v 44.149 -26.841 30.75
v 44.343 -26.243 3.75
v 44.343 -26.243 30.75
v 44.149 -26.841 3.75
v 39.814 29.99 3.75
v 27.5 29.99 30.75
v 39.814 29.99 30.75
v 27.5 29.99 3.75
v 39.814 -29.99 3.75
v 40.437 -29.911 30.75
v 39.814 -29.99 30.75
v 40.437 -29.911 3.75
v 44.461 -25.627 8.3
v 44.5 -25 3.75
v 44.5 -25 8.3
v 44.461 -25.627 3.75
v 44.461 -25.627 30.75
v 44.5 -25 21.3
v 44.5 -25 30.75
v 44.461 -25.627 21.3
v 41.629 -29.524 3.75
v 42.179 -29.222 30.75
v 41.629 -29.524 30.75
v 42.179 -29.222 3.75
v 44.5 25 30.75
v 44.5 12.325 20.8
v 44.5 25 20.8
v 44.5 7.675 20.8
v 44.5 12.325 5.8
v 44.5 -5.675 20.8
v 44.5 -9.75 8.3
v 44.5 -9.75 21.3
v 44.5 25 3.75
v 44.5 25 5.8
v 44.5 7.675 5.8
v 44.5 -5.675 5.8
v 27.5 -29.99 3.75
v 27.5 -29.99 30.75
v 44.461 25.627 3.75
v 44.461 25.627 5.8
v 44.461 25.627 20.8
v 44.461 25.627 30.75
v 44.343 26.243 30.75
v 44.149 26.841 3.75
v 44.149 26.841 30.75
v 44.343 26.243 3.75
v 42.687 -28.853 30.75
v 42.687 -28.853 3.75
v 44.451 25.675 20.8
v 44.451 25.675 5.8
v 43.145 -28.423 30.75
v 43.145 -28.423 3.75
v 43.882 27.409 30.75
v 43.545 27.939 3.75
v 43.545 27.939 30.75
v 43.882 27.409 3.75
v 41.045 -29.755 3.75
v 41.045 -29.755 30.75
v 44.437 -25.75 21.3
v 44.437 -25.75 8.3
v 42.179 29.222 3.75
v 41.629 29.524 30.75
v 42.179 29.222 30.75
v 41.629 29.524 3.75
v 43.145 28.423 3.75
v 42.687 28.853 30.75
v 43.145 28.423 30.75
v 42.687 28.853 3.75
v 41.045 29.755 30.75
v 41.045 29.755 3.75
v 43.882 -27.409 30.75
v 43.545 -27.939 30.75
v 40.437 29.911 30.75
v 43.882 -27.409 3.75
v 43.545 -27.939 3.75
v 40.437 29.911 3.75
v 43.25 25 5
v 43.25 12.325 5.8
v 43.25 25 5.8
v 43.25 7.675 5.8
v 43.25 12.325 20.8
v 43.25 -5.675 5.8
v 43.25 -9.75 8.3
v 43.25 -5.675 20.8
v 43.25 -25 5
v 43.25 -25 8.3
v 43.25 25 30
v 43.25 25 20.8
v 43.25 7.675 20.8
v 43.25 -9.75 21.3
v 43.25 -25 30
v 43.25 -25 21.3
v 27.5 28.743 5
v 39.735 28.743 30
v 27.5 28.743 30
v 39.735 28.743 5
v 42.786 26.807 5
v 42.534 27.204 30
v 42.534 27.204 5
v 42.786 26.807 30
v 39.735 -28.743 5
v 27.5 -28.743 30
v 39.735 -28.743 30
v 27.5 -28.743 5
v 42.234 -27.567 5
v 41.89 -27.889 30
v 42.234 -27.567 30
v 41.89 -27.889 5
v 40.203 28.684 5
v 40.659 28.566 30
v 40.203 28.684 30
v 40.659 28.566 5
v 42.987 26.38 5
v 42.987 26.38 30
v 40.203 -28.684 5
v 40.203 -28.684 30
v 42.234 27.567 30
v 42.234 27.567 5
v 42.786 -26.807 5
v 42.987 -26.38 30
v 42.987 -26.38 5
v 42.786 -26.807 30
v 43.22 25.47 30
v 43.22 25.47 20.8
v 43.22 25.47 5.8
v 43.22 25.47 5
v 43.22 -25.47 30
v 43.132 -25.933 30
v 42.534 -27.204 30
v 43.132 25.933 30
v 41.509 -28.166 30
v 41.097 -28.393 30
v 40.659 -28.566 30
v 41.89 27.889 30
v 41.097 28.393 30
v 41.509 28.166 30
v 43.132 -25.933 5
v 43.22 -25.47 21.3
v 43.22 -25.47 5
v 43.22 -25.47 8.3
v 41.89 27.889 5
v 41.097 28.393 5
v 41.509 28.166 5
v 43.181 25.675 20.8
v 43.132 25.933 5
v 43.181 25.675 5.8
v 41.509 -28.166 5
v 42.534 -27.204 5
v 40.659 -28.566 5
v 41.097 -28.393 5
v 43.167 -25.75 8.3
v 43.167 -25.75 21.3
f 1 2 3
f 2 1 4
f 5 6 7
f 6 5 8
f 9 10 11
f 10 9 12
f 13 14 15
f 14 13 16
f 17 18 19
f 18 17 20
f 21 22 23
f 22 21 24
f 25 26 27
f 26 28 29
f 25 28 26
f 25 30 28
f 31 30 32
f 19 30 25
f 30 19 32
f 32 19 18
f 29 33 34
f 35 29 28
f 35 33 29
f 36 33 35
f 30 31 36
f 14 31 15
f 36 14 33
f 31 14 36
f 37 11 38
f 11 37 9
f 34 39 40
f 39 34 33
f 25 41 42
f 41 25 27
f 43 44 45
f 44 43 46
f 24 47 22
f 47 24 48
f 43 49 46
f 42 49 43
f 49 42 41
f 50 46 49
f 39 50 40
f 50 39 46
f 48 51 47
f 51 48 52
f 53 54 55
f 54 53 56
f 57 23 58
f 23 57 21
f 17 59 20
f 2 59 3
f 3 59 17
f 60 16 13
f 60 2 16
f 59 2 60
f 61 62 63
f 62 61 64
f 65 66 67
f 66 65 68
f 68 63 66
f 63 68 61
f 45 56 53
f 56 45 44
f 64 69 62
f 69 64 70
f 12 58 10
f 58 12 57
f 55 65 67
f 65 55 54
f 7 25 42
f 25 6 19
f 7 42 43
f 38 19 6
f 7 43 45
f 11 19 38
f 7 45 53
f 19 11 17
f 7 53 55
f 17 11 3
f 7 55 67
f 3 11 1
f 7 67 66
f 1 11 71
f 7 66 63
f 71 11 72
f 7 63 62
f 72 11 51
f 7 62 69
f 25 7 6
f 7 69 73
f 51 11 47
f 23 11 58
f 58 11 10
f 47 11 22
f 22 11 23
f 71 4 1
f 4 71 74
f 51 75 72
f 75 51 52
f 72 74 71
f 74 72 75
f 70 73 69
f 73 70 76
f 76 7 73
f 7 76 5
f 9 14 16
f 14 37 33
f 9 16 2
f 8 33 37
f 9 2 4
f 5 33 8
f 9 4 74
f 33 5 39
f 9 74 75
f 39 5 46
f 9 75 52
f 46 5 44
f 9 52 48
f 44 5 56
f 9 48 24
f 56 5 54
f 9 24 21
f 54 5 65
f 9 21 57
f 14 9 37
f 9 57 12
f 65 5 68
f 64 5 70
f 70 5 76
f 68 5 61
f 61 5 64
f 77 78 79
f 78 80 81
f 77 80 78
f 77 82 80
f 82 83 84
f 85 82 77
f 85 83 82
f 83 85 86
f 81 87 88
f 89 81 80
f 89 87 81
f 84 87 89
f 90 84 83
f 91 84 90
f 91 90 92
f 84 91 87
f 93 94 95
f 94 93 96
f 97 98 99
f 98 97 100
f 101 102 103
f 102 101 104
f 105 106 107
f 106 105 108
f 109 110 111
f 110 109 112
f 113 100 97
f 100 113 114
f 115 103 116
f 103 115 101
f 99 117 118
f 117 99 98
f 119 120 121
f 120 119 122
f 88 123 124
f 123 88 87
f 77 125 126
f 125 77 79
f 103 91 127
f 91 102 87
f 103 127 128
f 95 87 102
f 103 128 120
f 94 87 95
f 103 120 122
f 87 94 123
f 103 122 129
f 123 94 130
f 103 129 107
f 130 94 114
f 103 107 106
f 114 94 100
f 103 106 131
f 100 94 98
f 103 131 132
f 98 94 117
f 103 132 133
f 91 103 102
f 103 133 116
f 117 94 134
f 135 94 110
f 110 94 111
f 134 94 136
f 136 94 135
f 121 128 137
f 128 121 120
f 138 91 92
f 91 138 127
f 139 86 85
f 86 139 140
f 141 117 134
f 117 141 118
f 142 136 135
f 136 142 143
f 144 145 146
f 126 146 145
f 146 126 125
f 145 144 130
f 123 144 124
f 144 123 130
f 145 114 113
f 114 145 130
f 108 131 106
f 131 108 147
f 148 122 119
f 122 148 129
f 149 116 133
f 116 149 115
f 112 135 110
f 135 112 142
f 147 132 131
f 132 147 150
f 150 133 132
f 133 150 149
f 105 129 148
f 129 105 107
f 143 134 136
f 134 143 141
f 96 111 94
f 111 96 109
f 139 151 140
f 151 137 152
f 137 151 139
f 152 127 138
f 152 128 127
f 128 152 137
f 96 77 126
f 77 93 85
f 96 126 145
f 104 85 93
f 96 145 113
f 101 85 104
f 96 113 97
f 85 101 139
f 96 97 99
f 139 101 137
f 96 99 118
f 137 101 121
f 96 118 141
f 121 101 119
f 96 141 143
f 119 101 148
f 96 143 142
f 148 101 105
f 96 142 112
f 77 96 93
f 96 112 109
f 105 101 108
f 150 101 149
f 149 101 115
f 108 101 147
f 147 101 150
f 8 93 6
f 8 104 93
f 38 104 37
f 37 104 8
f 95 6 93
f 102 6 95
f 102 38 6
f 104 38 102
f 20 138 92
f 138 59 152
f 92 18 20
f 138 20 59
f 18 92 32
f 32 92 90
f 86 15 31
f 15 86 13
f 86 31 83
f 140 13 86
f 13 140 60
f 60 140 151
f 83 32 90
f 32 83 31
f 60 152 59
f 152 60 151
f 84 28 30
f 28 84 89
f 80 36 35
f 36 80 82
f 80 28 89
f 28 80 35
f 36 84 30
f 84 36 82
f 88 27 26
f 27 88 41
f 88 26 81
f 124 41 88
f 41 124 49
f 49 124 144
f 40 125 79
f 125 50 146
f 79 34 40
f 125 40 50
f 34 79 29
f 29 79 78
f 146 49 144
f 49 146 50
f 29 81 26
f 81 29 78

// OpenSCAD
//===========================================================================
//
// PiPro Pi Case designed to mimic the 2019 Mac Pro look.
// derived from PrusaPi Pi case for Prusa MK3 https: 
//
// This part was originally designed 24 November 2017 by Joe McKeown. 
// and updated 22 June 2019.
// It's available under the terms of the Creative Commons CC-BY license 
// (https://creativecommons.org/licenses/by/3.0/).
// 
// History:
// V1.0 24 NOV 2017 First version
// v2.0 22 JUN 2019 Revised to look like Mac Pro and Not attach to Prusa
//===========================================================================

//Adapted by Jordan Knight to be a shelf for the Pi 4. 



sqrt3=sqrt(3);

cheese_r=5;//4;


epsilon=0.01;
baseGap=3.25;
PCBThick=1.3;
baseThick=1.25;
totalHeight=21.5;//20.2;
baseHeight=15;
bracketOffset=65; 

PCBBase=baseGap+PCBThick;

BoardSize=[85,56];
 
module outline(r=3){   
   hull()
   for (point=[[3,3],[3,53],[82,3],[82,53]]){
     translate(point) circle(r, $fn=50);
   }
 }

module EthSlotB(){
  //height is 13.5;
  JackWidth=16;
  translate([BoardSize[0]-5, 2.25, PCBBase])
  cube([10, JackWidth, 13]);
}

module USBSlotB(centerY){
  //height is 16;
  JackWidth=13.35;
  translate([BoardSize[0]-5, centerY-(JackWidth/2), PCBBase-2.5])
  cube([10, JackWidth, 15]);
}


module bottomShell() {
  
  difference(){
    linear_extrude(baseHeight + 12) outline(5);
    translate([0,0,baseThick]) 
      linear_extrude(baseHeight + 10) outline(3.75); 
    translate([0,0,-1]) 
     // linear_extrude(baseHeight + 10) outline(3.75);
    translate([-10,-10,-3])
      cube([80, 80, 40]);
 
    EthSlotB();
    USBSlotB(29);
    USBSlotB(47);   
 
  }
}

module base() {
    $fn=10;

    difference(){
        union(){           
            translate([0,0, cheese_r-1.25 ])
                union(){
                    bottomShell();           
                }
        }
       
    }
    
}

translate([-BoardSize[0]/2,-BoardSize[1]/2,0])
base();
